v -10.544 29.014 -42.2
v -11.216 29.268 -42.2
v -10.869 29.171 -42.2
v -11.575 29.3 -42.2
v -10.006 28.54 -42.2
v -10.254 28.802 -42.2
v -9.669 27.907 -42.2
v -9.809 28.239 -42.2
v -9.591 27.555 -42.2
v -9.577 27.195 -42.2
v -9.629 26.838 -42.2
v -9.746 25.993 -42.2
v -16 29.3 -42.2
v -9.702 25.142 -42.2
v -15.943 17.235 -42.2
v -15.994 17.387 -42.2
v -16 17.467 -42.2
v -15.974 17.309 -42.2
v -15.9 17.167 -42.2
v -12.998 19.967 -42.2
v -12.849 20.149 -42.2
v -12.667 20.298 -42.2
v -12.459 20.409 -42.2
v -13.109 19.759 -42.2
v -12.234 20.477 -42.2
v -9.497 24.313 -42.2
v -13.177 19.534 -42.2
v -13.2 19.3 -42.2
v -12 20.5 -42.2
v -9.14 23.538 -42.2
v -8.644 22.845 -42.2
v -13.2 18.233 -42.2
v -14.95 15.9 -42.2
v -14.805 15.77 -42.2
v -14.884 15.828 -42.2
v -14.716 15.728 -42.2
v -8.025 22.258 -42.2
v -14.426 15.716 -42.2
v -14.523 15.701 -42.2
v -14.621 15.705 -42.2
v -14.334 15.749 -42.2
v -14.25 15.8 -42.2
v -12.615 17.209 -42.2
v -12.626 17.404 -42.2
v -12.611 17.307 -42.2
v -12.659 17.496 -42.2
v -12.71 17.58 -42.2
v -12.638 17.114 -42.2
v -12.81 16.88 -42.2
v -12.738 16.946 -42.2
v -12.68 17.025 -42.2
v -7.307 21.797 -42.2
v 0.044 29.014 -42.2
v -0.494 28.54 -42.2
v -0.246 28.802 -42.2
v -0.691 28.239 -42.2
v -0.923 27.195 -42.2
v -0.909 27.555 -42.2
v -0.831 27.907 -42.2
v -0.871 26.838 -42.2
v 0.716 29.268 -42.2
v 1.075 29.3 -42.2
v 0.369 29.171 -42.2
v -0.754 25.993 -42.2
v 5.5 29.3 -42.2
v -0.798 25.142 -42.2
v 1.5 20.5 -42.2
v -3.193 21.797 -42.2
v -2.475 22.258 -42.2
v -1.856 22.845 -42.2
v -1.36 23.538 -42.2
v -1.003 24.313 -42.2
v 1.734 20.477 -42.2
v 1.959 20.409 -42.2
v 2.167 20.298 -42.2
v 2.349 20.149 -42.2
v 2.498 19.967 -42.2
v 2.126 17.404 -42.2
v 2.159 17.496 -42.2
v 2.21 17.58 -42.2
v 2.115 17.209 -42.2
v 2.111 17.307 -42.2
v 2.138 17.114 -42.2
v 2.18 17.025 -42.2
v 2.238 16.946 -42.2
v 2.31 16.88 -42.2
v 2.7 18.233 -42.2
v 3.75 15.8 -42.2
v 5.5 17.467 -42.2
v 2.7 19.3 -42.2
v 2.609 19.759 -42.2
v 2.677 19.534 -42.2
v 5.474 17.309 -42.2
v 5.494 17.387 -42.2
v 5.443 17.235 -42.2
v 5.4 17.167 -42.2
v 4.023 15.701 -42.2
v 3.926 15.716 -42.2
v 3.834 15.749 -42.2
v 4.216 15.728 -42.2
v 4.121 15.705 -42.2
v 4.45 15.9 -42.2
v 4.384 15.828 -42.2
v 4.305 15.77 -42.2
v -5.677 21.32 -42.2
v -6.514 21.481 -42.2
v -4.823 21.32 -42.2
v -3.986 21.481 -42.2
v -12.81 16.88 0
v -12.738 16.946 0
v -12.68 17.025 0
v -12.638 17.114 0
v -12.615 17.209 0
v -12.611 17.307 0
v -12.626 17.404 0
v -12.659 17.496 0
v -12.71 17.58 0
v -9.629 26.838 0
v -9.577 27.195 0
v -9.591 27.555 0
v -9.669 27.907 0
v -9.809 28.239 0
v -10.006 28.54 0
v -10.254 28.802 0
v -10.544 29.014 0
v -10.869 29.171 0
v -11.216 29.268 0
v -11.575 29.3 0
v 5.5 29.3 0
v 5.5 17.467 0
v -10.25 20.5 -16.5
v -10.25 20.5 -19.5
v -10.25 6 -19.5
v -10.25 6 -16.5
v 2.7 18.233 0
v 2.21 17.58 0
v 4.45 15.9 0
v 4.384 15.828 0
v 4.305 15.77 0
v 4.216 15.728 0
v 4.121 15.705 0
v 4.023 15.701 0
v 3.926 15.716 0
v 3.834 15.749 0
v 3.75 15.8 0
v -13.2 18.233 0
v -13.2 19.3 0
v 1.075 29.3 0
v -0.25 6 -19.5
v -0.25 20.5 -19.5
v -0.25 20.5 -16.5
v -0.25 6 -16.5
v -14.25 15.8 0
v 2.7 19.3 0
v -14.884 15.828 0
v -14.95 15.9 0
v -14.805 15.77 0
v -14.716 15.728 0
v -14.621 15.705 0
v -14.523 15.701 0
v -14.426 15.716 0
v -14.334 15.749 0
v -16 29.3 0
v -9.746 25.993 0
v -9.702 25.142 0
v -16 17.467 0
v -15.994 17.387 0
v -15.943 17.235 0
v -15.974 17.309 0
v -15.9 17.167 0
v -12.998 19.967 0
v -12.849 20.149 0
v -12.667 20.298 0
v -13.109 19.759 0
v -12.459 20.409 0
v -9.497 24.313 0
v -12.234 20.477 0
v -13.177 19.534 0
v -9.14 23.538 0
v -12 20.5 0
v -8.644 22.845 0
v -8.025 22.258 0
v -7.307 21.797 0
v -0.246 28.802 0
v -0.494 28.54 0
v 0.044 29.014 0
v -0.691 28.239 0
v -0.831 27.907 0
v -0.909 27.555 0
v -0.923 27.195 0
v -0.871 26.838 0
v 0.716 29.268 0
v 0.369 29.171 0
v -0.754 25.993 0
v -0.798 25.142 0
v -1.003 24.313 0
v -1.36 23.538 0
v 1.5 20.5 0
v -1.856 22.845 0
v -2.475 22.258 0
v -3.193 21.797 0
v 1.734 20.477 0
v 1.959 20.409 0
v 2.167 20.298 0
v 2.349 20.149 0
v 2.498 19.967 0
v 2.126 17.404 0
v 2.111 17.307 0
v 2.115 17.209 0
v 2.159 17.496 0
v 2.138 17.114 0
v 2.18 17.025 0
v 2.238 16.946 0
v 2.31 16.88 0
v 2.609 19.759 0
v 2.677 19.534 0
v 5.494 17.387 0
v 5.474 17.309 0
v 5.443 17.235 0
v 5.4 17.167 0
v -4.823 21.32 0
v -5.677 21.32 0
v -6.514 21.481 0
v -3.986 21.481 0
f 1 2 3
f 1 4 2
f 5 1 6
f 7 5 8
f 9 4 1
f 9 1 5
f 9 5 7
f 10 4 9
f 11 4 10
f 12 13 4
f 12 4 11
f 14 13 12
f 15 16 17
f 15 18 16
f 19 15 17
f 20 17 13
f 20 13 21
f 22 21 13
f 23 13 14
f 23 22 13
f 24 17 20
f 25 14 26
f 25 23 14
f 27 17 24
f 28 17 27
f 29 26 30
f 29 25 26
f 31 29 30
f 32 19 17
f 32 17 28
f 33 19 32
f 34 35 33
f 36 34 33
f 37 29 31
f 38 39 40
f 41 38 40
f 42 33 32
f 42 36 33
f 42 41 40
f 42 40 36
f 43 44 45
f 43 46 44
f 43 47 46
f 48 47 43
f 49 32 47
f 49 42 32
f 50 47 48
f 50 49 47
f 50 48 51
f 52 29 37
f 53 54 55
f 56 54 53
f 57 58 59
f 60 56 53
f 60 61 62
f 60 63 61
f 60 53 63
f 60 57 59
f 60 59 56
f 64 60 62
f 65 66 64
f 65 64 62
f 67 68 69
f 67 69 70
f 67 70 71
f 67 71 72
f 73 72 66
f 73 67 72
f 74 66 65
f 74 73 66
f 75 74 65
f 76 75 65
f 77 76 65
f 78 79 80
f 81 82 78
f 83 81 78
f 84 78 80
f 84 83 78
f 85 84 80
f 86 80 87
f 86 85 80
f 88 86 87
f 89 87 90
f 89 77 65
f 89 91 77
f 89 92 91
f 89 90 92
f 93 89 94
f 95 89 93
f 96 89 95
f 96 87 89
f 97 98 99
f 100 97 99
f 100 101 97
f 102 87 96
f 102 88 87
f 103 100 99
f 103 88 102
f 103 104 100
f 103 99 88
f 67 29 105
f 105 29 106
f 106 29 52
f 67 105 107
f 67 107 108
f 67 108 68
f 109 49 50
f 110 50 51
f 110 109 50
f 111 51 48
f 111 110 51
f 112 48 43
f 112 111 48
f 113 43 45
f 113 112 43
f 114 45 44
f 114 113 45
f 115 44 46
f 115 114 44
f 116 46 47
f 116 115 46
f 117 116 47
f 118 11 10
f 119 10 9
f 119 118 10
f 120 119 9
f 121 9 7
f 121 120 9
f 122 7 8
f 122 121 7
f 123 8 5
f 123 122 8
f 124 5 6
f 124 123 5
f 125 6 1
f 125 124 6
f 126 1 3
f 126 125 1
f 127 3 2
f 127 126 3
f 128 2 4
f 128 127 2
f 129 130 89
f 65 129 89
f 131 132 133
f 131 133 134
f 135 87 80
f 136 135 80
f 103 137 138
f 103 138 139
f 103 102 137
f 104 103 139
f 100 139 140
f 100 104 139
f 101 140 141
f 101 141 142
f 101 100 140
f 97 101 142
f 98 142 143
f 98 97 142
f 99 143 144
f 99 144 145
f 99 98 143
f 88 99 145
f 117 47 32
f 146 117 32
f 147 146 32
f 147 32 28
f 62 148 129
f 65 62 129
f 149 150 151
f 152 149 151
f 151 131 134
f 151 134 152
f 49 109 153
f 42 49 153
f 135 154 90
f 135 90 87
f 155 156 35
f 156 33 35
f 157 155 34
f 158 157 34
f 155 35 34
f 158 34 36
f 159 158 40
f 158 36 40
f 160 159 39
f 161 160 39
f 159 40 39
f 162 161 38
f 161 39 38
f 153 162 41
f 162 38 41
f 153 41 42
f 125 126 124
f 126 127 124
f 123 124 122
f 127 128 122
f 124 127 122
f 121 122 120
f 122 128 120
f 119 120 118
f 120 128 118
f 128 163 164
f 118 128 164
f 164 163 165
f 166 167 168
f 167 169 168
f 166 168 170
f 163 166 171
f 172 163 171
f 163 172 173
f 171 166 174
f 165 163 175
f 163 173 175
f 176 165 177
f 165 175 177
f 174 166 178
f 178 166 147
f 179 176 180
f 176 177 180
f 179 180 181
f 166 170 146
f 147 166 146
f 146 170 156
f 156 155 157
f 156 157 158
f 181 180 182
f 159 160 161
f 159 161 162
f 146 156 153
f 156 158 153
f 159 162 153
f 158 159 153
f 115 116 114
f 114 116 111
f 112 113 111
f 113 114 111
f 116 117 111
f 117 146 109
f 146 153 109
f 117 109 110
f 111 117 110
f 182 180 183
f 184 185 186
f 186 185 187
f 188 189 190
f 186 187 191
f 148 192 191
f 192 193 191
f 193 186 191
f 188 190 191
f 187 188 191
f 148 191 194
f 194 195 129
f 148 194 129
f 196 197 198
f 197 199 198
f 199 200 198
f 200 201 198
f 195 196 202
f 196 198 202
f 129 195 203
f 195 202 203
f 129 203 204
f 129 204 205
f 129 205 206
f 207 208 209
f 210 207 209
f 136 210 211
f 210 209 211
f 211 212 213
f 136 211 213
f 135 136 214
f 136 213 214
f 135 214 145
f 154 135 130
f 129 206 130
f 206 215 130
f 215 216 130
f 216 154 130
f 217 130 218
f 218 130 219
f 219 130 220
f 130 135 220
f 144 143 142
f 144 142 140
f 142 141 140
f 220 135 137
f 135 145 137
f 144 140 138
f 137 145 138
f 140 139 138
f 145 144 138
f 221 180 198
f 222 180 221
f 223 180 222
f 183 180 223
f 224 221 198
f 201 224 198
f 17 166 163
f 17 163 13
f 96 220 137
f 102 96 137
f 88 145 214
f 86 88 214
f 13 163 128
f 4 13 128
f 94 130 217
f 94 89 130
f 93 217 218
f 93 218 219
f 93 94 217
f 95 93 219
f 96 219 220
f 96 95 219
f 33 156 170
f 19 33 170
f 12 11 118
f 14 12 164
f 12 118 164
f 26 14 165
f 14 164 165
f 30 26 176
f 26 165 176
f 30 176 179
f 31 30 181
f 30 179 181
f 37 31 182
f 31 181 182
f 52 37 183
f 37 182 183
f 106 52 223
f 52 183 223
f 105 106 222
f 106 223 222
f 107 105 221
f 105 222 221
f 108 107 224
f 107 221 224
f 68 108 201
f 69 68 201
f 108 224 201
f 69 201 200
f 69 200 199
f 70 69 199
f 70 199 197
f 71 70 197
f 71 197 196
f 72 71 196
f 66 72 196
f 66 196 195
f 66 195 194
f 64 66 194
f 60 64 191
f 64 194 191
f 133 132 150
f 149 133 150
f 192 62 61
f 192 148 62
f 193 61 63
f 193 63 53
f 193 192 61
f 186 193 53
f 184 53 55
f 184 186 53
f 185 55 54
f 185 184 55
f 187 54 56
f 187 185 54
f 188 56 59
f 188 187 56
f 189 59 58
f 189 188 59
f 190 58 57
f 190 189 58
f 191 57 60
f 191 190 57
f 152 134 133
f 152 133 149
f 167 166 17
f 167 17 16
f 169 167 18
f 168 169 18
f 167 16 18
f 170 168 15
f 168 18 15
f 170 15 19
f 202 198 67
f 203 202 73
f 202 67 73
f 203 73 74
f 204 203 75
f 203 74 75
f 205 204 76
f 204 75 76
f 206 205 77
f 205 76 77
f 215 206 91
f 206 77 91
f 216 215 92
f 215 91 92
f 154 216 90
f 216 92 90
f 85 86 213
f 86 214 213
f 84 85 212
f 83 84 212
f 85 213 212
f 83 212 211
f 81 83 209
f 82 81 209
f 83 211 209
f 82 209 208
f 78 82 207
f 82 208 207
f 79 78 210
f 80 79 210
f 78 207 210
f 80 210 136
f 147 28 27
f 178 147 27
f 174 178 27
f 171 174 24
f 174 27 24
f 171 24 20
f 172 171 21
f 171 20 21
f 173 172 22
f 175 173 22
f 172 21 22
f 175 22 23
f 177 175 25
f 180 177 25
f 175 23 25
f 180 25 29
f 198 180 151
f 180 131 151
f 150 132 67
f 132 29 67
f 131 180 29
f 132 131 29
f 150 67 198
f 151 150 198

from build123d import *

# Parameters (mm, degrees)
EXTRUDE_1_DEPTH     = 42.2
CUT_EXTRUDE_5_DEPTH = 51.340143027
SKETCH_5_W          = 10
SKETCH_5_H          = 3
EXTRUDE_4_DEPTH     = 14.5
SKETCH_6_W          = 21.5
SKETCH_6_H          = 42.2
EXTRUDE_5_DEPTH     = 7
SKETCH_7_R          = 4.5
CUT_EXTRUDE_3_DEPTH = 42.2
FILLET_2_R          = 2
FILLET_3_R          = 0.5


with BuildPart() as part:
    # 草图2 → 凸台-拉伸1 (new body)
    with BuildSketch(Plane.XY):
        with BuildLine():
            ThreePointArc((2.5, 19.3), (2.207106781, 20.007106781), (1.5, 20.3))
            Line((1.5, 20.3), (-12, 20.3))
            ThreePointArc((-12, 20.3), (-12.707106781, 20.007106781), (-13, 19.3))
            Line((-13, 19.3), (-13, 18.3))
            Line((-13, 18.3), (-12.25, 17.3))
            Line((-12.25, 17.3), (-14.65, 15.5))
            Line((-14.65, 15.5), (-16, 17.3))
            Line((-16, 17.3), (-16, 22.3))
            Line((-16, 22.3), (5.5, 22.3))
            Line((5.5, 22.3), (5.5, 17.3))
            Line((5.5, 17.3), (4.15, 15.5))
            Line((4.15, 15.5), (1.75, 17.3))
            Line((1.75, 17.3), (2.5, 18.3))
            Line((2.5, 18.3), (2.5, 19.3))
        make_face()
    extrude(amount=-EXTRUDE_1_DEPTH)

    # 草图9 → 切除-拉伸5 (cut, through all)
    with BuildSketch(Plane(origin=(0, 0, -42.2), x_dir=(-1, 0, 0), z_dir=(0, 0, -1))):
        with BuildLine():
            Line((-2.7, 18.233333333), (-1.91, 17.18))
            Line((-1.91, 17.18), (-1.75, 17.3))
            Line((-1.75, 17.3), (-2.5, 18.3))
            Line((-2.5, 18.3), (-2.5, 19.3))
            ThreePointArc((-2.5, 19.3), (-2.207106781, 20.007106781), (-1.5, 20.3))
            Line((-1.5, 20.3), (12, 20.3))
            ThreePointArc((12, 20.3), (12.707106781, 20.007106781), (13, 19.3))
            Line((13, 19.3), (13, 18.3))
            Line((13, 18.3), (12.25, 17.3))
            Line((12.25, 17.3), (12.41, 17.18))
            Line((12.41, 17.18), (13.2, 18.233333333))
            Line((13.2, 18.233333333), (13.2, 19.3))
            ThreePointArc((13.2, 19.3), (12.848528137, 20.148528137), (12, 20.5))
            Line((12, 20.5), (-1.5, 20.5))
            ThreePointArc((-1.5, 20.5), (-2.348528137, 20.148528137), (-2.7, 19.3))
            Line((-2.7, 19.3), (-2.7, 18.233333333))
        make_face()
    extrude(amount=-CUT_EXTRUDE_5_DEPTH, mode=Mode.SUBTRACT)

    # 草图5 → 凸台-拉伸4 (add)
    with BuildSketch(Plane.XZ.offset(-20.5)):
        with Locations((-5.25, -18)):
            Rectangle(SKETCH_5_W, SKETCH_5_H)
    extrude(amount=EXTRUDE_4_DEPTH)

    # 草图6 → 凸台-拉伸5 (add)
    with BuildSketch(Plane(origin=(0, 22.3, 0), x_dir=(1, 0, 0), z_dir=(0, 1, 0))):
        with Locations((-5.25, 21.1)):
            Rectangle(SKETCH_6_W, SKETCH_6_H)
    extrude(amount=EXTRUDE_5_DEPTH)

    # 草图7 → 切除-拉伸3 (cut)
    with BuildSketch(Plane.XY):
        with Locations((-5.25, 25.8)):
            Circle(SKETCH_7_R)
    extrude(amount=-CUT_EXTRUDE_3_DEPTH, mode=Mode.SUBTRACT)

    # 圆角2
    fillet_2_edges = [part.edges().sort_by_distance(p)[0] for p in [
        (-2.421572875, 29.3, -21.1),
        (-8.078427125, 29.3, -21.1),
    ]]
    fillet(fillet_2_edges, radius=FILLET_2_R)

    # 圆角3
    fillet_3_edges = [part.edges().sort_by_distance(p)[0] for p in [
        (4.15, 15.5, -21.1),
        (5.5, 17.3, -21.1),
        (-16, 17.3, -21.1),
        (-14.65, 15.5, -21.1),
        (-12.41, 17.18, -21.1),
        (1.91, 17.18, -21.1),
    ]]
    fillet(fillet_3_edges, radius=FILLET_3_R)


solid = part.part
